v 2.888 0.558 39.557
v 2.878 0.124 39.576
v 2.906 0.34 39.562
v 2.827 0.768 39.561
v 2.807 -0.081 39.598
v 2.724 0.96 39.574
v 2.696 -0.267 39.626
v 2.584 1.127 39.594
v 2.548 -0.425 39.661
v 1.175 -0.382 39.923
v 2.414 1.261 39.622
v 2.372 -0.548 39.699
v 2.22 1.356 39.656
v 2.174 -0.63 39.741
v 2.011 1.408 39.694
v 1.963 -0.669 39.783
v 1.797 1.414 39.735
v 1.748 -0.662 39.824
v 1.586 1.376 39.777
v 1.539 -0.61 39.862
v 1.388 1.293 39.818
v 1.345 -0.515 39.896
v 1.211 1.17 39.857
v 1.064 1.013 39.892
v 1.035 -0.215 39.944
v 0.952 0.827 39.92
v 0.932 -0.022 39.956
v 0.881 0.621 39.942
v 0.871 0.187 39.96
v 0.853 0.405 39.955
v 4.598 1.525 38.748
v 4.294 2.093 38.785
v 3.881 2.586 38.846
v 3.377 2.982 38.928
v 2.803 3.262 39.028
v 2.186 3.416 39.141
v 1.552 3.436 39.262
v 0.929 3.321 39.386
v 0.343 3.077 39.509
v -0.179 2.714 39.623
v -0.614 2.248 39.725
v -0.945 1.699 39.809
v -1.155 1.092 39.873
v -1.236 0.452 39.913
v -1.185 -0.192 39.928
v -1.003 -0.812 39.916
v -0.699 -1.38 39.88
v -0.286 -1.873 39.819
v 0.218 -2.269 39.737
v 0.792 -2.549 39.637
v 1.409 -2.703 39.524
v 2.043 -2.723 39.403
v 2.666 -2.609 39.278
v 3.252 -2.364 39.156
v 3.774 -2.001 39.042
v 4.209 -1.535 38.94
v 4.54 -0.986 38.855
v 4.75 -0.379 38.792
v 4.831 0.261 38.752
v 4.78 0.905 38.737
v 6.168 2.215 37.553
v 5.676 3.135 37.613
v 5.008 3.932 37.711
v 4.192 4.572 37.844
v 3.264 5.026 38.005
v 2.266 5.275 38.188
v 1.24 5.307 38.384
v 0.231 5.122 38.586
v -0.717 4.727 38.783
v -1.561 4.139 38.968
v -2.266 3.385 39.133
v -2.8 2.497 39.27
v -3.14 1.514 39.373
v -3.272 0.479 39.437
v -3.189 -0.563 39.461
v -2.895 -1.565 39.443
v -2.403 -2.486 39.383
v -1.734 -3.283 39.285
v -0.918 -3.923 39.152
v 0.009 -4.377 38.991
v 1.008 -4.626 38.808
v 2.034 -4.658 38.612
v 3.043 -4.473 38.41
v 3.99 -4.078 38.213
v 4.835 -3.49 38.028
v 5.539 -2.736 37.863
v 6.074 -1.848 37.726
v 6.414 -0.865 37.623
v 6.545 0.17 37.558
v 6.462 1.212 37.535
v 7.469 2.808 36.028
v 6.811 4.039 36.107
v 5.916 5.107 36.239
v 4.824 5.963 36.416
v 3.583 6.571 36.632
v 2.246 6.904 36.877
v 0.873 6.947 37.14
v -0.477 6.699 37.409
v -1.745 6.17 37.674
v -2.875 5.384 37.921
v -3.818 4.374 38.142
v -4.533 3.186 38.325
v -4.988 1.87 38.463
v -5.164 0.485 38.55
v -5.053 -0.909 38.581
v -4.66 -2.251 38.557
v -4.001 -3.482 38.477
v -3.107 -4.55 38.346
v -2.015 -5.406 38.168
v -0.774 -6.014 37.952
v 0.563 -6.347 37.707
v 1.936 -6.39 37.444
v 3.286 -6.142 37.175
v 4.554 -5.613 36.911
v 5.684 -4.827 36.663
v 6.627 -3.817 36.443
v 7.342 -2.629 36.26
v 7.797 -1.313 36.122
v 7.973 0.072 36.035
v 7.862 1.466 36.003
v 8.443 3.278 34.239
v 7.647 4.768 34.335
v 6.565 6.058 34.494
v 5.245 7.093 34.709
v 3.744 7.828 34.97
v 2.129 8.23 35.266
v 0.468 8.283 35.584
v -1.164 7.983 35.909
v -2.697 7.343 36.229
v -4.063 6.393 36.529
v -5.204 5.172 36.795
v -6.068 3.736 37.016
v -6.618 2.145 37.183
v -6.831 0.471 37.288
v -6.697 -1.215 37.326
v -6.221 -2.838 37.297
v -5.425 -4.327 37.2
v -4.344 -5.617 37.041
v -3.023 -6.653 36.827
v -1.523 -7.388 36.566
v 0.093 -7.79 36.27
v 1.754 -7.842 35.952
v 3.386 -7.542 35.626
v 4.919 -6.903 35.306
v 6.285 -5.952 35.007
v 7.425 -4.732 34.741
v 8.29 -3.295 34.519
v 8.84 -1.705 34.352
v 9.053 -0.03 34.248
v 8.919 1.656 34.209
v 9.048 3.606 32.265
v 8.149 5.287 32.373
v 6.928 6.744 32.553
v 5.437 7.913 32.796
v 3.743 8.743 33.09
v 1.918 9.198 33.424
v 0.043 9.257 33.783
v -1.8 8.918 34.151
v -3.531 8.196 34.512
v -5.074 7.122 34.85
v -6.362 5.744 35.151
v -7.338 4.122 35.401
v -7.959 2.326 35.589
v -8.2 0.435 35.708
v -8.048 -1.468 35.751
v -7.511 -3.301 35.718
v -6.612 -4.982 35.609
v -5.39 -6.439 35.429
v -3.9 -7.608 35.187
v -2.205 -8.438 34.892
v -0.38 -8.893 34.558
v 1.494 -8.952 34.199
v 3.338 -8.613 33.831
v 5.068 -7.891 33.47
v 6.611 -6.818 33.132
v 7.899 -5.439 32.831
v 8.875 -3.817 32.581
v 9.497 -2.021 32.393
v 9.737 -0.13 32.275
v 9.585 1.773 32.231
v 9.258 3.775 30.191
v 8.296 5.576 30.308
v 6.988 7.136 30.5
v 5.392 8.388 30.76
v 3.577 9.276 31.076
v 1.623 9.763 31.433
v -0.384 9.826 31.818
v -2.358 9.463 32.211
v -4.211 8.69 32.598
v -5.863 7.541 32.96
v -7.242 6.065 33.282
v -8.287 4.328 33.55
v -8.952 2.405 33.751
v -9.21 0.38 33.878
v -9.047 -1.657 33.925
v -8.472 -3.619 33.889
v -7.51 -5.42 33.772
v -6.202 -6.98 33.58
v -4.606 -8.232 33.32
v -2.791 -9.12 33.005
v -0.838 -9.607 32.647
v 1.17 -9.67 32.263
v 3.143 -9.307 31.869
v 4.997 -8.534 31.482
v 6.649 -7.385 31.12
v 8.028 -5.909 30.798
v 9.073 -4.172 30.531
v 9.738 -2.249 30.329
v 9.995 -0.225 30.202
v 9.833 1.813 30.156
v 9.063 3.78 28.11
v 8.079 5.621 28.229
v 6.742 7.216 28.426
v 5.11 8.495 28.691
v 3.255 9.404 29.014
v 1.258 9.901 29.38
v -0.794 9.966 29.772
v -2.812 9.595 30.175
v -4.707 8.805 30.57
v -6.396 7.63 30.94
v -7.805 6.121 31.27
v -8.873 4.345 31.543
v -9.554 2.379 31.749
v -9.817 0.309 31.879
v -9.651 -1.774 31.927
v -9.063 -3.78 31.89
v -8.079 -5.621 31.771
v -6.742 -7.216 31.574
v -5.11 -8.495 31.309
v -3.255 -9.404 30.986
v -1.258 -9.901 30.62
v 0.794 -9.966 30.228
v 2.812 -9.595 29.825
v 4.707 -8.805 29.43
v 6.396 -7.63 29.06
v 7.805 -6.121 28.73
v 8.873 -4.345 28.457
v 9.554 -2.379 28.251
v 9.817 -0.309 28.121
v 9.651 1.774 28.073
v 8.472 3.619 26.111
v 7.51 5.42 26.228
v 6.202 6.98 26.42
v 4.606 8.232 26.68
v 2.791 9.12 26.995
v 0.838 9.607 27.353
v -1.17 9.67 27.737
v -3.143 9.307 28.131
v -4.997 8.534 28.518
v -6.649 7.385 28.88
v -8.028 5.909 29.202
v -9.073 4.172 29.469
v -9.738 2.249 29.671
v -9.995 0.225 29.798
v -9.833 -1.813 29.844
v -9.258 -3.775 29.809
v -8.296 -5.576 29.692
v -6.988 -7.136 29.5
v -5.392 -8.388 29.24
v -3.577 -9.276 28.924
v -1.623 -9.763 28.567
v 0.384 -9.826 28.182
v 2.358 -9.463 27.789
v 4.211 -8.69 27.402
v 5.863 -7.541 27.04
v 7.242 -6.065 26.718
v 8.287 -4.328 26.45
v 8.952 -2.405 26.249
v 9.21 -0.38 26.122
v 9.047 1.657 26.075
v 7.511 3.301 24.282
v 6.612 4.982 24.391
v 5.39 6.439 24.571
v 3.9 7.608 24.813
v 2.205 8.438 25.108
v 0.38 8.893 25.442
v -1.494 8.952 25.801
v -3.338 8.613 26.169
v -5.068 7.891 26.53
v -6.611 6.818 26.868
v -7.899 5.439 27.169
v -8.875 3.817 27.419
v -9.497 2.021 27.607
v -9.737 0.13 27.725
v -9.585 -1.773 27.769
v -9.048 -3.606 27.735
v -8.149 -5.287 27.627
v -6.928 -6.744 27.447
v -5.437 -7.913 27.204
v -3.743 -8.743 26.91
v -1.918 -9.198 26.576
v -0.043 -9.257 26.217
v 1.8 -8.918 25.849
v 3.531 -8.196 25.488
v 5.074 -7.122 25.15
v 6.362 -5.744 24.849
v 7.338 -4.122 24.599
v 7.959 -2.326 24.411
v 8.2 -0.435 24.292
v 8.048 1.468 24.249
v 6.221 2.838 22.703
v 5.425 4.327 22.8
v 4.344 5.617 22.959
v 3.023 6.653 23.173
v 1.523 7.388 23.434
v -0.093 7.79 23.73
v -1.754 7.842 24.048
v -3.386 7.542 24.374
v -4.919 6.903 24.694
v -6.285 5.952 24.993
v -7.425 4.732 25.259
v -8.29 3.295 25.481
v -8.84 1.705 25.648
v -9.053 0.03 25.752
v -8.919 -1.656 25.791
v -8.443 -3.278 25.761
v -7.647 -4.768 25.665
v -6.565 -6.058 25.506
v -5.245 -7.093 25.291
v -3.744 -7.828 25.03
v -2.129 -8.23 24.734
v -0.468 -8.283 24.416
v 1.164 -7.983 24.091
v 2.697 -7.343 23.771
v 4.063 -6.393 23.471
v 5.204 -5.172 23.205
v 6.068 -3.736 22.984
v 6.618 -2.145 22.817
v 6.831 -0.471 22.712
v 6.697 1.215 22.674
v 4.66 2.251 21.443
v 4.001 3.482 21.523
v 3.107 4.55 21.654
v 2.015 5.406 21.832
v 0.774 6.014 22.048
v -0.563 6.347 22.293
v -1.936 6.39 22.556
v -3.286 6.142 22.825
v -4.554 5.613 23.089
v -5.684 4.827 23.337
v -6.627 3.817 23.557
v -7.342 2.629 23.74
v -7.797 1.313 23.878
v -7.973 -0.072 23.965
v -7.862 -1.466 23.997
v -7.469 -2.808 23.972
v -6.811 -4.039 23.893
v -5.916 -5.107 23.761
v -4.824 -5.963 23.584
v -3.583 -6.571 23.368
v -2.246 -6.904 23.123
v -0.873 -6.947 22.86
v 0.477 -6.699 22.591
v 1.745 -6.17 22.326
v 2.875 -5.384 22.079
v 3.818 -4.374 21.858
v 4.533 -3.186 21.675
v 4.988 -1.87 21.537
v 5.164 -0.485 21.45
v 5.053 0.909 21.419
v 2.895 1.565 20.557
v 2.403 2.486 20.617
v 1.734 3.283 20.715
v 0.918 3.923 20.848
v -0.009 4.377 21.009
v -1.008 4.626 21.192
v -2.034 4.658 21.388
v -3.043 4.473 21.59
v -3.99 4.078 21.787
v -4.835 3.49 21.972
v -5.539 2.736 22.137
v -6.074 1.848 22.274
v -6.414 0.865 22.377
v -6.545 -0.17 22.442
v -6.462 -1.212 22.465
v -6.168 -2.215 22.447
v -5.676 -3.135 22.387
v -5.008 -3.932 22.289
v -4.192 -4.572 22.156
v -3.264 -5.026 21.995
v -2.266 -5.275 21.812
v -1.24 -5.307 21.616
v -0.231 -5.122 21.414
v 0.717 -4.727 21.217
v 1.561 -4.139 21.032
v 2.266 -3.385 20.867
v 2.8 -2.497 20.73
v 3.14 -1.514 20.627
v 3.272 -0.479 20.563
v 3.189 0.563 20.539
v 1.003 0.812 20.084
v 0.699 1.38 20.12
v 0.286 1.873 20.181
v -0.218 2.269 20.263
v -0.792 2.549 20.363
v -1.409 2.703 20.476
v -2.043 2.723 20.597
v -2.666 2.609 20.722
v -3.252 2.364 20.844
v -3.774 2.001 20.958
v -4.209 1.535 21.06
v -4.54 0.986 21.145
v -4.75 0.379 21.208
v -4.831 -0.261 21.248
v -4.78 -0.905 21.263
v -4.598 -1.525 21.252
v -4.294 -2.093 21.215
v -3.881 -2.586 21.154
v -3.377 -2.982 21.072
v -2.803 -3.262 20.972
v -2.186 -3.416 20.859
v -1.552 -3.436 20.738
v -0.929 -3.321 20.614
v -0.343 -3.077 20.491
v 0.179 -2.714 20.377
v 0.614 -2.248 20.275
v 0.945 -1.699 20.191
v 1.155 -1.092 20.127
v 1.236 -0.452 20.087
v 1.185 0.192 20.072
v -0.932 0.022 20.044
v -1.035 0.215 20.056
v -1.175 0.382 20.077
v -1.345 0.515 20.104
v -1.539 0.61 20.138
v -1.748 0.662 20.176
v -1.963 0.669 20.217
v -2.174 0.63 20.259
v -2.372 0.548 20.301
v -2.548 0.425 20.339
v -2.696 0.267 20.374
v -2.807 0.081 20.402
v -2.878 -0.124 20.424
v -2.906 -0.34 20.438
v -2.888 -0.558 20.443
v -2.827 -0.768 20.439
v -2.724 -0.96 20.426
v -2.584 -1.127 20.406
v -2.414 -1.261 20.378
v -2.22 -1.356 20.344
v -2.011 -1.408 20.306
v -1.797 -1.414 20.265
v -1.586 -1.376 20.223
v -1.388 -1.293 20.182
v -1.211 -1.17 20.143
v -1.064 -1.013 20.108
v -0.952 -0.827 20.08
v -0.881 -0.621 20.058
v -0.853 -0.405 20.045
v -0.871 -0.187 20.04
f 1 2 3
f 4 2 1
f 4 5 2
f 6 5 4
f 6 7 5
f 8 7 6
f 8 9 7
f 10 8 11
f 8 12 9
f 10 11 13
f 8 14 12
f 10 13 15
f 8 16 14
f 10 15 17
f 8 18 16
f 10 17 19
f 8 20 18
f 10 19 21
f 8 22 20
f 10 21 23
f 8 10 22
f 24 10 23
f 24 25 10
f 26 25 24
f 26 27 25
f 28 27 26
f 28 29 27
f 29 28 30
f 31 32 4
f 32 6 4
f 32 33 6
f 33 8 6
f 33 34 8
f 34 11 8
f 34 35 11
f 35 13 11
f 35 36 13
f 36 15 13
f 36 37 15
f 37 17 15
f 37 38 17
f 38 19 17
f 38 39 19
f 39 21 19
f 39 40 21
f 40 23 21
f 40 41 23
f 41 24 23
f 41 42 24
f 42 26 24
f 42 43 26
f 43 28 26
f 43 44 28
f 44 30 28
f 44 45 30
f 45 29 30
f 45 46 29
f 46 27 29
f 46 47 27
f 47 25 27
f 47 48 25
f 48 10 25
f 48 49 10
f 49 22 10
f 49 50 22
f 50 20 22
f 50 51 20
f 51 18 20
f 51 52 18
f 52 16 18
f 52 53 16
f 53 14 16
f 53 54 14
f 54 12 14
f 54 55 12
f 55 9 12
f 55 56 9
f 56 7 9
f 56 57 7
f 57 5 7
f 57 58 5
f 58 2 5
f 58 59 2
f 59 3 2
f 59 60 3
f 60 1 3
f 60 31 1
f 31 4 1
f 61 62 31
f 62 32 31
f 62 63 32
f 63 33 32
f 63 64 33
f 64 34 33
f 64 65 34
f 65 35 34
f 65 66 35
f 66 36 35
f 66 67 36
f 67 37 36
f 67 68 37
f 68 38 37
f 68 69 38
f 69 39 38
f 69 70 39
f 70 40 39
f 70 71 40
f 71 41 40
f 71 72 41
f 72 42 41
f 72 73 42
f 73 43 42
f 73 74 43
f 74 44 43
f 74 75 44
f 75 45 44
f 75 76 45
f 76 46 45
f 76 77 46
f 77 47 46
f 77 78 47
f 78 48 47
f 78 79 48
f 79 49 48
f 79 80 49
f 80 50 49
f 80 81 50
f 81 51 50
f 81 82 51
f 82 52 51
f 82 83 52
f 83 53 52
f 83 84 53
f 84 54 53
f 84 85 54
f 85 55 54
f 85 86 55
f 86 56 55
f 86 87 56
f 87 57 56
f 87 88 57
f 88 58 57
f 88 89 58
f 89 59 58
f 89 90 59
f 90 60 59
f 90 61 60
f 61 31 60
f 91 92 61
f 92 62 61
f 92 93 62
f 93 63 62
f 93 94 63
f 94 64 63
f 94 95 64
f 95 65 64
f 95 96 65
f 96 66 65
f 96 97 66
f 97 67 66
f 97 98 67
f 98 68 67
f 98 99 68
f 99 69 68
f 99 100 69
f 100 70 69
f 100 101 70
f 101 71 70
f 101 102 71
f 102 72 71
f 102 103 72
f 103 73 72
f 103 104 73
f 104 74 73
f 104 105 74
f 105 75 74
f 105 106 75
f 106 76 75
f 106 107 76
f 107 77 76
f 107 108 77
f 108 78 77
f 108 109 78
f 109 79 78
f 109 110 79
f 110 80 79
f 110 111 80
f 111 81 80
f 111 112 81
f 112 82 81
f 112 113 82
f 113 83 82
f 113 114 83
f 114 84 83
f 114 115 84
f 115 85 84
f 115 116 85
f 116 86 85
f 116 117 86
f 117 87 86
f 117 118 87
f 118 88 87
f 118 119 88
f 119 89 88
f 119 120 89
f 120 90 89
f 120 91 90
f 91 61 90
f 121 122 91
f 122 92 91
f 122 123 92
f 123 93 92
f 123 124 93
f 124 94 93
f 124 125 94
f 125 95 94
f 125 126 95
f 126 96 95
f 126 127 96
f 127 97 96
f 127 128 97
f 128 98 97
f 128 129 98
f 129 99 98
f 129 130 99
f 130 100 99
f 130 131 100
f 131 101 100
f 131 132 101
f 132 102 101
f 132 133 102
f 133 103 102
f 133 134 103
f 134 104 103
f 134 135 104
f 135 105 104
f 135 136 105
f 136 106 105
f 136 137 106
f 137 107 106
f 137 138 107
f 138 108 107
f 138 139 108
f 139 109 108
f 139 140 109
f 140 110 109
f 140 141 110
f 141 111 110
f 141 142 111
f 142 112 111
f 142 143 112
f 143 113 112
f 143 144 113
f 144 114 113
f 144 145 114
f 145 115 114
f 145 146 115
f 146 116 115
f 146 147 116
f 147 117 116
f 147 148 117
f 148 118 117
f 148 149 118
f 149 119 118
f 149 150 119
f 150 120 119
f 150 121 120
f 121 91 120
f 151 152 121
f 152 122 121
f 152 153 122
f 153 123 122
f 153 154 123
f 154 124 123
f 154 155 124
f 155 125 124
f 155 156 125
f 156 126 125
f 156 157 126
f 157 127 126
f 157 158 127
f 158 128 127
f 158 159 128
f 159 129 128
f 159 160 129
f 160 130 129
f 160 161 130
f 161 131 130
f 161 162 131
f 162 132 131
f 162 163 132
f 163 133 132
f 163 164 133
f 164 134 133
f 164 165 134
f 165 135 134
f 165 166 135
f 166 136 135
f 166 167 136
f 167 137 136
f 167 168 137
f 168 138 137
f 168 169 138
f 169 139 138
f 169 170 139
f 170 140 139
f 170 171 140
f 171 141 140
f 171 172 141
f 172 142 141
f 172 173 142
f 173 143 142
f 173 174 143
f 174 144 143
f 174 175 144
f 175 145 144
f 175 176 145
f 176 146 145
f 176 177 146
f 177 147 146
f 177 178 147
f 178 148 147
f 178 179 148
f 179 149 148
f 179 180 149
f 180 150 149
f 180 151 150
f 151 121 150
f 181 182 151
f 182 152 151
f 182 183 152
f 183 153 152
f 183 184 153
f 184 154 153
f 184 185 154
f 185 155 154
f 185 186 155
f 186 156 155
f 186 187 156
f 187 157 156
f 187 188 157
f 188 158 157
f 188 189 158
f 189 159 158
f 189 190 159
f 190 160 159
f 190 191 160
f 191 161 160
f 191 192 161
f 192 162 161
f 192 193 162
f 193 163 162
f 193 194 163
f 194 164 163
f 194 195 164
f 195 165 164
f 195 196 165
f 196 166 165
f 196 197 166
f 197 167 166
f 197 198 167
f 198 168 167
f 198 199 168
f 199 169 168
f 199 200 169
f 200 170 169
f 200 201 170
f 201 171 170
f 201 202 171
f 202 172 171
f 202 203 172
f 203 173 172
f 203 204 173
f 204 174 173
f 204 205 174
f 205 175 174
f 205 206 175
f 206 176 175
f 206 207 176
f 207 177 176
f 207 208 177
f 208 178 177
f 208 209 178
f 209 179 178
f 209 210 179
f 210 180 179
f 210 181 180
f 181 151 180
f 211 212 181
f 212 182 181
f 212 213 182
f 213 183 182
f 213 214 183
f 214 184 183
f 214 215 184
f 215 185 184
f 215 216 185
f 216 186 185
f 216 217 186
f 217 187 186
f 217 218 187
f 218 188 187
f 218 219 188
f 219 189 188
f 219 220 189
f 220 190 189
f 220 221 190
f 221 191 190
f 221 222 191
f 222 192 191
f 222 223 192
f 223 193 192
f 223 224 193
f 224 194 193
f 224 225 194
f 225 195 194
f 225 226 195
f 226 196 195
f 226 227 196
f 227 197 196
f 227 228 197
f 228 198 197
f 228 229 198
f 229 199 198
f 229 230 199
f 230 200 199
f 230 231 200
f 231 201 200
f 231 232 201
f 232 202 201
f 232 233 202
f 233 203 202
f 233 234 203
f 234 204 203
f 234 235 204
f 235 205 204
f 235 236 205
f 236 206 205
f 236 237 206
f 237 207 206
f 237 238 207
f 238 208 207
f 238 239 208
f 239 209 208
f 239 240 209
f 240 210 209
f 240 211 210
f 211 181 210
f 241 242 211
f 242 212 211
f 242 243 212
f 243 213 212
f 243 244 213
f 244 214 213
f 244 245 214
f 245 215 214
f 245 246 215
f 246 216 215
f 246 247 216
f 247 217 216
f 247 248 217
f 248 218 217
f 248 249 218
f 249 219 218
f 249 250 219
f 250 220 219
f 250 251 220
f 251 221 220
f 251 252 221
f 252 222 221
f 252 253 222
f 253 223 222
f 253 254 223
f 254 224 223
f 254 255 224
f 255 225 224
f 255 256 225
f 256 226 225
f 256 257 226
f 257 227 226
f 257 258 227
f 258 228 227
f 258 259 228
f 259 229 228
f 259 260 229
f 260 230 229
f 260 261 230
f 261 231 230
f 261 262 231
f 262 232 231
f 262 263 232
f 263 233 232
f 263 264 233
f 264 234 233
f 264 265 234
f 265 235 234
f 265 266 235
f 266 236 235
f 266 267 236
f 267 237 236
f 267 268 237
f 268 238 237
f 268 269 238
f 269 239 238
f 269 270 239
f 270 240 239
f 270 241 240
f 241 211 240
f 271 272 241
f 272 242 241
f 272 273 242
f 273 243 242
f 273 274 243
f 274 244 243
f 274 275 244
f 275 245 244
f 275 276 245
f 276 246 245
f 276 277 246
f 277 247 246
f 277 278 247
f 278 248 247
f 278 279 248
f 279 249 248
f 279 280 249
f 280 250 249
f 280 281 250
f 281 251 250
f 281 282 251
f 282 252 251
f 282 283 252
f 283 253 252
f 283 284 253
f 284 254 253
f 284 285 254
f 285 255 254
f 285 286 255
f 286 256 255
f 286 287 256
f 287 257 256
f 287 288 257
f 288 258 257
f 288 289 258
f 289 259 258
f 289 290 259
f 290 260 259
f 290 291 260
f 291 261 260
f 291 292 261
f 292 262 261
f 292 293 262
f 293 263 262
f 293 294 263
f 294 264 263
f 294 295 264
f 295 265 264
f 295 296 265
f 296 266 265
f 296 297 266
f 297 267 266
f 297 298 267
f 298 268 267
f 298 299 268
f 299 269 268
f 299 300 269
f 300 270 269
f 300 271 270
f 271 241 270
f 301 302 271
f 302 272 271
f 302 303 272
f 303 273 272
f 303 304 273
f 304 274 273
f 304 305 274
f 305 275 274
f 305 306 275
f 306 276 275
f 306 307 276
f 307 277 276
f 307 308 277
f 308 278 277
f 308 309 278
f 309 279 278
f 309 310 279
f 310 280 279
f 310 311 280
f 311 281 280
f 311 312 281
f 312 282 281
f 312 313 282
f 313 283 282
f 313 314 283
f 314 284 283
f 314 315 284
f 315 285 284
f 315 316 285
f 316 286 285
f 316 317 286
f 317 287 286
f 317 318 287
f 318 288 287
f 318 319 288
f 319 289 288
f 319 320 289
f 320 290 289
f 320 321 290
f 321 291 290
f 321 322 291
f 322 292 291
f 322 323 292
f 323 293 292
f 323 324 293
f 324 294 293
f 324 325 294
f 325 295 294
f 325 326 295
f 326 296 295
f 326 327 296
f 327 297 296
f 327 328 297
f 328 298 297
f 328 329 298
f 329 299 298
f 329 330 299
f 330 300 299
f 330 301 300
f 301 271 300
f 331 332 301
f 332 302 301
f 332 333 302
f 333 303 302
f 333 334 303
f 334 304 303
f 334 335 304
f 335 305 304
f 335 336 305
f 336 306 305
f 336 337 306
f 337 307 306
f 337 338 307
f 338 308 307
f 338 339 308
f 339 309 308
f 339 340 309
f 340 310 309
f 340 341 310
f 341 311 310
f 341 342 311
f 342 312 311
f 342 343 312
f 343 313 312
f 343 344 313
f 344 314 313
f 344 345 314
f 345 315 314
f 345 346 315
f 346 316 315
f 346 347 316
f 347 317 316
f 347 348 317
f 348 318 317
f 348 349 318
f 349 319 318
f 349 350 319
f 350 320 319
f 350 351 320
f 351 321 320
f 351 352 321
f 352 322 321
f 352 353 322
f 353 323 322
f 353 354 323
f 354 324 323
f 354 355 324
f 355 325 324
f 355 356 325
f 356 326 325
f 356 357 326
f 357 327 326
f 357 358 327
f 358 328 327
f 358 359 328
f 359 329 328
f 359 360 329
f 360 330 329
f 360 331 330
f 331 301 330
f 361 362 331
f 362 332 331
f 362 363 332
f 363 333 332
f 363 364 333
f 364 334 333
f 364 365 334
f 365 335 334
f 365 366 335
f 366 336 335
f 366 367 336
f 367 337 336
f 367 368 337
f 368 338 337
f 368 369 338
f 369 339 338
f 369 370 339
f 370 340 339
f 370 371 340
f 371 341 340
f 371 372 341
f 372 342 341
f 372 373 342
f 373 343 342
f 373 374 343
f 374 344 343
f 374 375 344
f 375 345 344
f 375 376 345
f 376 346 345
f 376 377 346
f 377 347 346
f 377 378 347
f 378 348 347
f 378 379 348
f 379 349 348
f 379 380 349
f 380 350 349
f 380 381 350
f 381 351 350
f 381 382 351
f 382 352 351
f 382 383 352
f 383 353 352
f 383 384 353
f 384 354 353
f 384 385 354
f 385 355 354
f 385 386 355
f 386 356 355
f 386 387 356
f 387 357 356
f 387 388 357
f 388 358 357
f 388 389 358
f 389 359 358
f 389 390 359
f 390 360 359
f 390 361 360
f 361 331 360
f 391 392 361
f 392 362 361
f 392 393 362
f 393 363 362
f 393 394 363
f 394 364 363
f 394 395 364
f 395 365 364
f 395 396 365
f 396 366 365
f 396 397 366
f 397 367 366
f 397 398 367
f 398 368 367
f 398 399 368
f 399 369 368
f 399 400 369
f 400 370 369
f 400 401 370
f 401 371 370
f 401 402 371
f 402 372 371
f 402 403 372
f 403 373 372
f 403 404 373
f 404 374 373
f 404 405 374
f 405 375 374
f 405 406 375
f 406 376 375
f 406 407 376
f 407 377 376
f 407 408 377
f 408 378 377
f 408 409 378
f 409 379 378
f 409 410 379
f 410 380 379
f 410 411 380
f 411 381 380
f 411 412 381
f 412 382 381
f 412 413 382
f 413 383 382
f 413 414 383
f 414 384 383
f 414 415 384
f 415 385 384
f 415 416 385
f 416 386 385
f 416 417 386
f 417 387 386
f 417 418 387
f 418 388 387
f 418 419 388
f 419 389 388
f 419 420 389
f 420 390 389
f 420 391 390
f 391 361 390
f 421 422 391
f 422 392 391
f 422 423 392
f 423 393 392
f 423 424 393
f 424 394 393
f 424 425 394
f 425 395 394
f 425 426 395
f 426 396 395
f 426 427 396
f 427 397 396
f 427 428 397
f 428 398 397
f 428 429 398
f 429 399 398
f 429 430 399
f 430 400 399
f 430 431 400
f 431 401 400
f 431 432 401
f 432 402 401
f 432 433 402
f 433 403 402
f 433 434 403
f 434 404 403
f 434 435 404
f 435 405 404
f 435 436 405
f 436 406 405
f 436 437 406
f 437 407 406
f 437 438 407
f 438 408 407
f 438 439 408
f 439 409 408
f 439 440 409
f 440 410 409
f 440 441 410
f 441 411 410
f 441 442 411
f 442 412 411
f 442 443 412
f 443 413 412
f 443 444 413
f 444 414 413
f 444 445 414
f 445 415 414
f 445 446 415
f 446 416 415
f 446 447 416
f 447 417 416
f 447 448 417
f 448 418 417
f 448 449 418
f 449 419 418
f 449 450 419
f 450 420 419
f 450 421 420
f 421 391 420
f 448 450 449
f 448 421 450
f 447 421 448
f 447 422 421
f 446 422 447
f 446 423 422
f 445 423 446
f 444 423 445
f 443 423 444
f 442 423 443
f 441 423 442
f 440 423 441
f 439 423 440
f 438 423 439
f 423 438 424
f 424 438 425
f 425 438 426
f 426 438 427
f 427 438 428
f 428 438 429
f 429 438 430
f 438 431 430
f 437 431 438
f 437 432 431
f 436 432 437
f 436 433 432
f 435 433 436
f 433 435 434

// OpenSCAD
// This indicates the pin (revolute) joint.
// 
// The revolute is generically modeled as
// a coincident point and parallel constraint.


// in-plane constraint

color("red", 0.5){
translate([0,0,30])
  rotate(25,[0,1,2])
    sphere(10);
}

color("green", 0.5){
translate([0,0,30])
  rotate(25, [0,1,2])
    square([300, 300], true);
}

// parallel-axis constraint


color("red", 0.5){
translate([50,0,50])
  rotate([5,40,0])
    square([300,300], true);
}

color("green", 0.5){
translate([0,10,50])
  rotate([5,40,0])
    square([300,300], true);
}

// You can see that the red component
// is free to move the point in translation 
// along the green plane.
// Red can also rotate about an axis
// perpendicular to the red plane but not
// about the non-parallel plane.
// Consider the path of the earth in its
// orbital plane where is can move in the 
// orbtal plane while rotating on its axis. 
